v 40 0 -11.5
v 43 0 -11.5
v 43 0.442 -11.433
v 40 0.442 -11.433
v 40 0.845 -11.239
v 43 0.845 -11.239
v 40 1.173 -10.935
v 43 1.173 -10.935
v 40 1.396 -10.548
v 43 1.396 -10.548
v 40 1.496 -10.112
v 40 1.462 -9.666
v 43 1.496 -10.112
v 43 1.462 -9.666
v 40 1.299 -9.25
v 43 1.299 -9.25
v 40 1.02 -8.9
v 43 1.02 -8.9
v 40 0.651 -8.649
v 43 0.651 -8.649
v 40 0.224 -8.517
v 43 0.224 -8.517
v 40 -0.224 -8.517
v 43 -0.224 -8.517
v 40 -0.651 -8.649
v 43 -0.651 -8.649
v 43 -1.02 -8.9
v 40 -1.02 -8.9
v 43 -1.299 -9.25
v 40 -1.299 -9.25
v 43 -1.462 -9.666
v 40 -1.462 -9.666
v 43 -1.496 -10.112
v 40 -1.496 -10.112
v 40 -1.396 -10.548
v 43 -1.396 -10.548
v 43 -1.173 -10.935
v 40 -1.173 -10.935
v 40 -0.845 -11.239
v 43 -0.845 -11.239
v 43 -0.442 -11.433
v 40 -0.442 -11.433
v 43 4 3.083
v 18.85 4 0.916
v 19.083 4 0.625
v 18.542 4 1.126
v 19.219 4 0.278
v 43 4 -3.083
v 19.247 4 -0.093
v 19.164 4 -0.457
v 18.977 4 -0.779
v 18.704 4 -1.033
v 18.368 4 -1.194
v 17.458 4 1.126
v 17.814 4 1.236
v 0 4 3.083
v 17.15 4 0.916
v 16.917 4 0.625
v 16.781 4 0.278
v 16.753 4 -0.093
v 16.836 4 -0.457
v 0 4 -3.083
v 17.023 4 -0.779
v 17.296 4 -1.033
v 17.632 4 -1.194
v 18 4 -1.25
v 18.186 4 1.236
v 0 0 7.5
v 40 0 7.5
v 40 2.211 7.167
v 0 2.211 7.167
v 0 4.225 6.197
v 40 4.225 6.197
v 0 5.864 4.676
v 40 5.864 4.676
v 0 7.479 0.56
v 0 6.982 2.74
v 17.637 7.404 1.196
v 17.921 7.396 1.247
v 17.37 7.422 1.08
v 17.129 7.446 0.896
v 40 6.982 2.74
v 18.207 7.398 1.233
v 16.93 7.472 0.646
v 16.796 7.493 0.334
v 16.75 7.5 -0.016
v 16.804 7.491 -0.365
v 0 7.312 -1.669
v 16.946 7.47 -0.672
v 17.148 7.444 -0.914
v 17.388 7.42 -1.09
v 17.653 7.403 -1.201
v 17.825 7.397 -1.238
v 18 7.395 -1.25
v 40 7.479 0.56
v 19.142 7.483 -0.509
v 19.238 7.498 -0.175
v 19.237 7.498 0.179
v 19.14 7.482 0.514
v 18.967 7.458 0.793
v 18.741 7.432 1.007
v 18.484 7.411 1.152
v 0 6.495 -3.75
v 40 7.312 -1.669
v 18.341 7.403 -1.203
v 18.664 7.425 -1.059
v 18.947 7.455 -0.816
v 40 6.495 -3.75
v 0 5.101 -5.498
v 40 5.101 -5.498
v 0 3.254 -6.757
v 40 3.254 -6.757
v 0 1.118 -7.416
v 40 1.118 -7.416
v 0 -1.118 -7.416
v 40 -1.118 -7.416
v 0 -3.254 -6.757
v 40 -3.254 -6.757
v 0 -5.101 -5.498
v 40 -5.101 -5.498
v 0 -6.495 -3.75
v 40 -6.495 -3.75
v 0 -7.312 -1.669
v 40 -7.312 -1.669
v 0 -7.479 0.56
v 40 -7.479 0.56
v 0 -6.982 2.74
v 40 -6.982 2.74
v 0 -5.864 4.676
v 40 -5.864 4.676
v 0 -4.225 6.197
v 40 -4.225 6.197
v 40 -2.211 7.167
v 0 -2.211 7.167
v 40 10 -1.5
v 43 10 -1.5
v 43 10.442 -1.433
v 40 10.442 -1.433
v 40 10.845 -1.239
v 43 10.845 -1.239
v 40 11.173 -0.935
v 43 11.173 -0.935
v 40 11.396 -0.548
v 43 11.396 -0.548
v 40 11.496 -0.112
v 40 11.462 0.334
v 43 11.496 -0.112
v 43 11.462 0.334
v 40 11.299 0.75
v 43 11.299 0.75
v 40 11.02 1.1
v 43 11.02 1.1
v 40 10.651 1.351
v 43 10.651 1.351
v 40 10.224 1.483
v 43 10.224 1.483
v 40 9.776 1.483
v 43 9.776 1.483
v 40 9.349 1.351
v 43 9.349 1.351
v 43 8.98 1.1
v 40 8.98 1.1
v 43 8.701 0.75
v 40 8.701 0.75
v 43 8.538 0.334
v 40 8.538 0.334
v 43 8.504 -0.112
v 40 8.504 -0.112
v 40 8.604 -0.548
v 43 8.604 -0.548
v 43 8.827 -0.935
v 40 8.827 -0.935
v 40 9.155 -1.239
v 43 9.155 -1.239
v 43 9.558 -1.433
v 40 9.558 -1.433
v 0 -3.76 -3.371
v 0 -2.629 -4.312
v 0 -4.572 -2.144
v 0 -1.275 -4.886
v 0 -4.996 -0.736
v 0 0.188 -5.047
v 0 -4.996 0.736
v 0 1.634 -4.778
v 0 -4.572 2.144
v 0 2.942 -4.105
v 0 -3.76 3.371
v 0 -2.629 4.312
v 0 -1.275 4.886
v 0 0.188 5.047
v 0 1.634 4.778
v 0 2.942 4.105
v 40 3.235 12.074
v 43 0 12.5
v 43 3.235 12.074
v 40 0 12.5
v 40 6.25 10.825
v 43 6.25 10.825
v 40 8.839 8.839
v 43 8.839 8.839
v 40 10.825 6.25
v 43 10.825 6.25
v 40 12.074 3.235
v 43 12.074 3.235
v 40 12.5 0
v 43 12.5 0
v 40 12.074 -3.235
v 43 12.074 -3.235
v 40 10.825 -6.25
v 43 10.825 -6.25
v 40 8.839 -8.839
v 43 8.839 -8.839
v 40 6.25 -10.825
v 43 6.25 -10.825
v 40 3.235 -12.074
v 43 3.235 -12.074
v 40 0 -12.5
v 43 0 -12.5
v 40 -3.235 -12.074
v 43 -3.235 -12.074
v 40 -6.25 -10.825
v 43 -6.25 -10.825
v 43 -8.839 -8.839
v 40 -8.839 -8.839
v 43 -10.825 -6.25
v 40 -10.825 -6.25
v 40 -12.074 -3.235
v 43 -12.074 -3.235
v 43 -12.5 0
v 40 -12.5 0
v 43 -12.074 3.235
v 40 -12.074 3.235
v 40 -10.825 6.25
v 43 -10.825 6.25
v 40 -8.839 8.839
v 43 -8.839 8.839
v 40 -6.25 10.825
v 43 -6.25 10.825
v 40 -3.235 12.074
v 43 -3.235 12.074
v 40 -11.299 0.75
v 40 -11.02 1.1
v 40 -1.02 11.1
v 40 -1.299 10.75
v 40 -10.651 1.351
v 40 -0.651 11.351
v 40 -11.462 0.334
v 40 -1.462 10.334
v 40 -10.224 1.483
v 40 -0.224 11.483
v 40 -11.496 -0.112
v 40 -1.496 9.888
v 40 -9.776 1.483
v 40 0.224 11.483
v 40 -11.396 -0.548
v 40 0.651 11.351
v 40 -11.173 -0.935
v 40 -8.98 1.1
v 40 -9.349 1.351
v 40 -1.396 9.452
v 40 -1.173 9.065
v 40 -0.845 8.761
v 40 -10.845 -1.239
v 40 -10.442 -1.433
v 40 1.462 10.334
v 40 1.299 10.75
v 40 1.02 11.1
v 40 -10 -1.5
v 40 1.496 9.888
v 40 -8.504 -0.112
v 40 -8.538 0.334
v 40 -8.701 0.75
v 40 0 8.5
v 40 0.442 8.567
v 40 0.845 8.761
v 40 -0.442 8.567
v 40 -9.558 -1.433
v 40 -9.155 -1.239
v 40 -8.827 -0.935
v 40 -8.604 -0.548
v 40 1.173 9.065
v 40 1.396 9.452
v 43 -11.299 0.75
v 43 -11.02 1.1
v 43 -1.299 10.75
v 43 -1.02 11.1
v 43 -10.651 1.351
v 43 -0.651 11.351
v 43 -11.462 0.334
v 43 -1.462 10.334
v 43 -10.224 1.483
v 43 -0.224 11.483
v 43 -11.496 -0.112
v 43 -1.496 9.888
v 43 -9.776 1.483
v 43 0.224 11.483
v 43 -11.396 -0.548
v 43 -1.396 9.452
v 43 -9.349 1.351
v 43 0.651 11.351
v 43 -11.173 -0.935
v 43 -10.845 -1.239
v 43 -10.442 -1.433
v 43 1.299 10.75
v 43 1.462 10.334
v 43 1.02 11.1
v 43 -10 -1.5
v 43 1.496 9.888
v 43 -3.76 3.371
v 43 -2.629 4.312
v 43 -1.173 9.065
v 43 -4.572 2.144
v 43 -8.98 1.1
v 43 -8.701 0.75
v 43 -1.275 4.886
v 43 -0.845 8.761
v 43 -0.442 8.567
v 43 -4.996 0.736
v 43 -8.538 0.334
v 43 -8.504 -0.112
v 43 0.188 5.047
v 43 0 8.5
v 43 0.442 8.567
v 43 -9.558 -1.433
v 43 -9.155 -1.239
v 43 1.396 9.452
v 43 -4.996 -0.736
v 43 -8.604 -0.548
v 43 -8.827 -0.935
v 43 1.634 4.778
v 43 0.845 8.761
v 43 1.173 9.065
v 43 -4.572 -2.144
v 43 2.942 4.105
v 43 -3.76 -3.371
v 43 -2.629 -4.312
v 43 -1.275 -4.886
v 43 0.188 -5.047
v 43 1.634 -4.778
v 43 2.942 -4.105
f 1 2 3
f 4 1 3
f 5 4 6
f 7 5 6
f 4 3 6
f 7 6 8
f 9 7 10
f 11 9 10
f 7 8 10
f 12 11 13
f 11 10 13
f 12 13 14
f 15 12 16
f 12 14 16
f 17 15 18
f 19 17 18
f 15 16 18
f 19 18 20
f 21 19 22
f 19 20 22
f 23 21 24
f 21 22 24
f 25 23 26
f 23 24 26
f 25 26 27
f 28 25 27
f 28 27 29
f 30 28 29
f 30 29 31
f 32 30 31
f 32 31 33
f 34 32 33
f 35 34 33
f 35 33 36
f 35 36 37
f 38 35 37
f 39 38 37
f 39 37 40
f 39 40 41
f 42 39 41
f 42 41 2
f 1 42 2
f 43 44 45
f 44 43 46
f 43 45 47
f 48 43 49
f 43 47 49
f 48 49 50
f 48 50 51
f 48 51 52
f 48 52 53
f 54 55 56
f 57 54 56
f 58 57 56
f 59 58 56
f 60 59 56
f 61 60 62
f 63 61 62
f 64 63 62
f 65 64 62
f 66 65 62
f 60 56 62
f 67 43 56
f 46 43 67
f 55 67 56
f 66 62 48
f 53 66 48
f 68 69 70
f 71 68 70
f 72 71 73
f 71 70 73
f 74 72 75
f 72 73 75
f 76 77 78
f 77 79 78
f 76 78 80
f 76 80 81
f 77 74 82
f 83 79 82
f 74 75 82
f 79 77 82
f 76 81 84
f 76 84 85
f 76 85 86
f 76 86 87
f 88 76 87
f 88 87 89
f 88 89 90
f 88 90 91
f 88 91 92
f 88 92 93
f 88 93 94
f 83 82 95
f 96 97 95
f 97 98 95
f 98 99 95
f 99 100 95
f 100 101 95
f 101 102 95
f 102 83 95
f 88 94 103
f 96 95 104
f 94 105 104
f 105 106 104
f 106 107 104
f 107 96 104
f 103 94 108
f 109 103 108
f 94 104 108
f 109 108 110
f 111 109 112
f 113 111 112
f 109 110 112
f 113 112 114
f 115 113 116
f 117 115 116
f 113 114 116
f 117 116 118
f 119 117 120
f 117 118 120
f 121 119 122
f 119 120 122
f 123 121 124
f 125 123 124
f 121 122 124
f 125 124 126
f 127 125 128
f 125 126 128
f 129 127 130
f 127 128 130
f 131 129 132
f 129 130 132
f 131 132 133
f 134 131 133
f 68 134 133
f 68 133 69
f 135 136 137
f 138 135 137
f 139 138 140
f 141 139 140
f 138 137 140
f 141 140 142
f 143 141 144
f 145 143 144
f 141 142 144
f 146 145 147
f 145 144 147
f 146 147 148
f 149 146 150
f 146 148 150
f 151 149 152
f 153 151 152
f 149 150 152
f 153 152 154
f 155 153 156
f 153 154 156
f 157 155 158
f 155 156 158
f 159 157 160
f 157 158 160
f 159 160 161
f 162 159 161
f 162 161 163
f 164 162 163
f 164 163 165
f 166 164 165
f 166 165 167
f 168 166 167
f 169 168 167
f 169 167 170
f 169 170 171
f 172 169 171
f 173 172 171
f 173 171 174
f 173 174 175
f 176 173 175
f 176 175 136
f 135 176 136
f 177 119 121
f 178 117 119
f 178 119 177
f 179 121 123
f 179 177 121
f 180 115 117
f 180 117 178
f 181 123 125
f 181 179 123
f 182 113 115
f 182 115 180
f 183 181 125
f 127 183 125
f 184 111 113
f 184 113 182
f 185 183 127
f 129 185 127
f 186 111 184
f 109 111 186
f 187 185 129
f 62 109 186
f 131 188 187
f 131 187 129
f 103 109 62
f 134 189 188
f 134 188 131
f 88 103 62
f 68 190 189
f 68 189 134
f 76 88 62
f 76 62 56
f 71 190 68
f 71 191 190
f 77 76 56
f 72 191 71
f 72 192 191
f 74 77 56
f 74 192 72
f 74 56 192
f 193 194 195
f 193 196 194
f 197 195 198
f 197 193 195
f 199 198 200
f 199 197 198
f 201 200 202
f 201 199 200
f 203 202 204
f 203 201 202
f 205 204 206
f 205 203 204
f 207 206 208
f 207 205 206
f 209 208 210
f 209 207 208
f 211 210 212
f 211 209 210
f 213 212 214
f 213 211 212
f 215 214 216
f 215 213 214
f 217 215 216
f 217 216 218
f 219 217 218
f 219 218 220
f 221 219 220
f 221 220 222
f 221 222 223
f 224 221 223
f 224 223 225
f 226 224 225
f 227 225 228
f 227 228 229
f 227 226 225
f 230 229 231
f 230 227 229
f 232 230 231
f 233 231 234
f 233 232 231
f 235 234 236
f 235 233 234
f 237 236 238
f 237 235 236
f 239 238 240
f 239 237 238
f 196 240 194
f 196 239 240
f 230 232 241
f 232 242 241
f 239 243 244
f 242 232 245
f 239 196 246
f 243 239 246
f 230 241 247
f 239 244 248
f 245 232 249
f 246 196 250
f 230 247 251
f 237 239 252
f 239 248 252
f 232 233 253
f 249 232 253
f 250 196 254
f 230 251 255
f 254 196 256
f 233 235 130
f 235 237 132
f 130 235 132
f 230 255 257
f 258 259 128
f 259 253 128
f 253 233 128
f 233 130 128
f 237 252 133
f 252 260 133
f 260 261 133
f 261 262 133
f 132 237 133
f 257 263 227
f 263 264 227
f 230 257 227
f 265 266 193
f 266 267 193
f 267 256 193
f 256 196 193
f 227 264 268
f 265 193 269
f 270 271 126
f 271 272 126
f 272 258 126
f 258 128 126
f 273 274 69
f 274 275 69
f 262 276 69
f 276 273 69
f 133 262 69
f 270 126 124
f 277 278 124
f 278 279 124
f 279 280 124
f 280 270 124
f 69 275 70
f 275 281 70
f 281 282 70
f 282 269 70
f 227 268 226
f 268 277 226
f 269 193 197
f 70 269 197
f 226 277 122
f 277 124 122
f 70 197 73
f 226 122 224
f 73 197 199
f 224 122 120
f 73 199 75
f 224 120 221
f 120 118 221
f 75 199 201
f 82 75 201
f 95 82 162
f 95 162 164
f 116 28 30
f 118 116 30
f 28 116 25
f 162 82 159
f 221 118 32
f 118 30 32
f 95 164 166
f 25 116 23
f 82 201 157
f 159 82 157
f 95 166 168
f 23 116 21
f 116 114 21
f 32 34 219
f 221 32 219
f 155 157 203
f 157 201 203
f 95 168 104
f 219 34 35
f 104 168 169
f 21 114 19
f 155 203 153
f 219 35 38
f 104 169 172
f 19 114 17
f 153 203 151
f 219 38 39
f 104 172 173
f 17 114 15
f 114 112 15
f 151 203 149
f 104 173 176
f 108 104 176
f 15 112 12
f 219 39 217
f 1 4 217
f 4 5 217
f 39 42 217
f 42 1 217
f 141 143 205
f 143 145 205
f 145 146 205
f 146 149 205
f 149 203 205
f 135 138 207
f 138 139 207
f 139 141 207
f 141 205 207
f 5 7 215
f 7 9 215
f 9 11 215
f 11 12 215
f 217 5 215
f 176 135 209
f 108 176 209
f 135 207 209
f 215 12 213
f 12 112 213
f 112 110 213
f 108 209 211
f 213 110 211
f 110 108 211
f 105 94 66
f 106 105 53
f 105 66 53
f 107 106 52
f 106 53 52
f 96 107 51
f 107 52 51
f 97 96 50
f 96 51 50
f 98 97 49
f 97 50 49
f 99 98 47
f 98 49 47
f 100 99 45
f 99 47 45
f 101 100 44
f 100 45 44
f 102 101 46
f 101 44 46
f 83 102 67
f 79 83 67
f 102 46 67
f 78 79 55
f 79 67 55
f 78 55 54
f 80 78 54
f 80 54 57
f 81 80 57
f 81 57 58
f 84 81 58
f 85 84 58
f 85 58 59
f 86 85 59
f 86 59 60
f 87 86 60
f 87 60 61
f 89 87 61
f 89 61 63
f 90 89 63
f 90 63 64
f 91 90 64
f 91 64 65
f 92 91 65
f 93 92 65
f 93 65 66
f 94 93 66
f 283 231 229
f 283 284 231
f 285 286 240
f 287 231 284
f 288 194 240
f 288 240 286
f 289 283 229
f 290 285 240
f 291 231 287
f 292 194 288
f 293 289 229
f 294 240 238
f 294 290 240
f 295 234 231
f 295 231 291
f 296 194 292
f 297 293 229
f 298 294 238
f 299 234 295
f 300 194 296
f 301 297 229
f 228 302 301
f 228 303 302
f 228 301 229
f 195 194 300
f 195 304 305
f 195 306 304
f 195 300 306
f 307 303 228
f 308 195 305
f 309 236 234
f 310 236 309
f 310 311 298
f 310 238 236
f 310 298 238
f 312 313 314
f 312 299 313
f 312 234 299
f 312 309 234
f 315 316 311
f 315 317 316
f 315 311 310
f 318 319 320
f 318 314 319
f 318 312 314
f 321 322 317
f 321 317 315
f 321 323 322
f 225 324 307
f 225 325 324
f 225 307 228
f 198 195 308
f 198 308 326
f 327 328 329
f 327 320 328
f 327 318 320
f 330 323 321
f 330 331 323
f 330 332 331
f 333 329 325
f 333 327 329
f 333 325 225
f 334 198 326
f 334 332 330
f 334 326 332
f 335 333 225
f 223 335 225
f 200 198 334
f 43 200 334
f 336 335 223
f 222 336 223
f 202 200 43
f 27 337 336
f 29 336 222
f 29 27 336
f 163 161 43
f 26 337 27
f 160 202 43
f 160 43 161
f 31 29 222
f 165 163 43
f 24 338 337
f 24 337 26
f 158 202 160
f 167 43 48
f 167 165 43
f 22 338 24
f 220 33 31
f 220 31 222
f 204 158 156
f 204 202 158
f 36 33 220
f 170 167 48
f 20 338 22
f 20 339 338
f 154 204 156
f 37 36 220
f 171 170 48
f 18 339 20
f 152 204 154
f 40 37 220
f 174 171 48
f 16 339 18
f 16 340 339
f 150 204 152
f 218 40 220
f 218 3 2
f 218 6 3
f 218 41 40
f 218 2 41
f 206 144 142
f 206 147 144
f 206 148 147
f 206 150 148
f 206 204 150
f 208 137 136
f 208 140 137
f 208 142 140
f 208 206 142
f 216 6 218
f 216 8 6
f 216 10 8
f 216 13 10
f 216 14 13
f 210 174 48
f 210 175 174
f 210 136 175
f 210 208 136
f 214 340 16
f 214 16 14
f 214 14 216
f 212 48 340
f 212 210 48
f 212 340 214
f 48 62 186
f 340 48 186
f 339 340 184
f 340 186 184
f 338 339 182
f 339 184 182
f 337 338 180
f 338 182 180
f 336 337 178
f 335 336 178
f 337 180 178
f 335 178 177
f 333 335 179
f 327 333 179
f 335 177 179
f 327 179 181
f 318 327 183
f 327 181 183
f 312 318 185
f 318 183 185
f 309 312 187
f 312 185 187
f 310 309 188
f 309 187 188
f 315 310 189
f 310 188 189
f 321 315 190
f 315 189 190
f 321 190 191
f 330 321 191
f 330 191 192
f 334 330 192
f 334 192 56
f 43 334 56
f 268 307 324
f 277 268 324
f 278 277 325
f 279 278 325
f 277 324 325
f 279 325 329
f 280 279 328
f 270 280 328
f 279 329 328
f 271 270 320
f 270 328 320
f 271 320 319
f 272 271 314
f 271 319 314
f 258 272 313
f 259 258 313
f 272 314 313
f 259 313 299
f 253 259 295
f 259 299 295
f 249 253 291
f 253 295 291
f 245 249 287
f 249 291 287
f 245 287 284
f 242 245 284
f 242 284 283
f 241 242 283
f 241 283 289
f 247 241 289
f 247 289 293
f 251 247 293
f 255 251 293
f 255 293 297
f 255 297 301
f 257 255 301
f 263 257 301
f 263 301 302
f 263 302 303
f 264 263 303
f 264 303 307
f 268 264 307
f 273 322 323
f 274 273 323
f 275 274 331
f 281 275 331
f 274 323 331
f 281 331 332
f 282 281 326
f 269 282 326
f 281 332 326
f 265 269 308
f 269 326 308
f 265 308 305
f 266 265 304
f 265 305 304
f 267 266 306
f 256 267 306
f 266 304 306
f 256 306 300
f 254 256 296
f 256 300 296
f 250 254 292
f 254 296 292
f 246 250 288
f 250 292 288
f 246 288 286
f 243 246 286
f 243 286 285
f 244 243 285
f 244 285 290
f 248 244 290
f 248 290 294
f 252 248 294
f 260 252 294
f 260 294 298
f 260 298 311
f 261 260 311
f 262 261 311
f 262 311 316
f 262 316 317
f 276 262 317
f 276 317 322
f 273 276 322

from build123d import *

# Parameters (mm, degrees)
SKETCH_1_W            = 3
SKETCH_1_H            = 12.5
SKETCH_2_R            = 7.5
EXTRUDE_1_DEPTH       = 40
CUT_EXTRUDE_1_DEPTH   = 47.491934784
HOLE_WIZARD_3_0_3_3_D = 3
SKETCH_9_R            = 1.25
CUT_EXTRUDE_2_DEPTH   = 10


with BuildPart() as part:
    # 草图1 → 旋转1 (revolve)
    with BuildSketch(Plane(origin=(0, 0, 0), x_dir=(-1, 0, 0), z_dir=(0, 0, -1)), mode=Mode.PRIVATE) as revolve_1_sk:
        with Locations((-41.5, 6.25)):
            Rectangle(SKETCH_1_W, SKETCH_1_H)
    revolve(revolve_1_sk.sketch.rotate(Axis((43, 0, 0), (-1, 0, 0)), 270), axis=Axis((43, 0, 0), (-1, 0, 0)))

    # 草图2 → 凸台-拉伸1 (add)
    with BuildSketch(Plane.ZY.offset(-40)):
        Circle(SKETCH_2_R)
    extrude(amount=EXTRUDE_1_DEPTH)

    # 草图3 → 切除-拉伸1 (cut, through all)
    with BuildSketch(Plane.ZY):
        with BuildLine():
            Line((3.082612528, 4), (-3.082612528, 4))
            ThreePointArc((-3.082612528, 4), (0, -5.05), (3.082612528, 4))
        make_face()
    extrude(amount=-CUT_EXTRUDE_1_DEPTH, mode=Mode.SUBTRACT)

    # Ø3.0 (3) 直径孔3 (through all)
    with Locations(Plane.ZY.offset(-40)):
        with Locations((10, 0), (0, -10), (-10, 0), (0, 10)):
            Hole(HOLE_WIZARD_3_0_3_3_D / 2)

    # 草图9 → 切除-拉伸2 (cut)
    with BuildSketch(Plane.XZ.offset(-4)):
        with Locations(Location((18, 0, 0), (0, 0, 270))):
            Circle(SKETCH_9_R)
    extrude(amount=-CUT_EXTRUDE_2_DEPTH, mode=Mode.SUBTRACT)


solid = part.part
